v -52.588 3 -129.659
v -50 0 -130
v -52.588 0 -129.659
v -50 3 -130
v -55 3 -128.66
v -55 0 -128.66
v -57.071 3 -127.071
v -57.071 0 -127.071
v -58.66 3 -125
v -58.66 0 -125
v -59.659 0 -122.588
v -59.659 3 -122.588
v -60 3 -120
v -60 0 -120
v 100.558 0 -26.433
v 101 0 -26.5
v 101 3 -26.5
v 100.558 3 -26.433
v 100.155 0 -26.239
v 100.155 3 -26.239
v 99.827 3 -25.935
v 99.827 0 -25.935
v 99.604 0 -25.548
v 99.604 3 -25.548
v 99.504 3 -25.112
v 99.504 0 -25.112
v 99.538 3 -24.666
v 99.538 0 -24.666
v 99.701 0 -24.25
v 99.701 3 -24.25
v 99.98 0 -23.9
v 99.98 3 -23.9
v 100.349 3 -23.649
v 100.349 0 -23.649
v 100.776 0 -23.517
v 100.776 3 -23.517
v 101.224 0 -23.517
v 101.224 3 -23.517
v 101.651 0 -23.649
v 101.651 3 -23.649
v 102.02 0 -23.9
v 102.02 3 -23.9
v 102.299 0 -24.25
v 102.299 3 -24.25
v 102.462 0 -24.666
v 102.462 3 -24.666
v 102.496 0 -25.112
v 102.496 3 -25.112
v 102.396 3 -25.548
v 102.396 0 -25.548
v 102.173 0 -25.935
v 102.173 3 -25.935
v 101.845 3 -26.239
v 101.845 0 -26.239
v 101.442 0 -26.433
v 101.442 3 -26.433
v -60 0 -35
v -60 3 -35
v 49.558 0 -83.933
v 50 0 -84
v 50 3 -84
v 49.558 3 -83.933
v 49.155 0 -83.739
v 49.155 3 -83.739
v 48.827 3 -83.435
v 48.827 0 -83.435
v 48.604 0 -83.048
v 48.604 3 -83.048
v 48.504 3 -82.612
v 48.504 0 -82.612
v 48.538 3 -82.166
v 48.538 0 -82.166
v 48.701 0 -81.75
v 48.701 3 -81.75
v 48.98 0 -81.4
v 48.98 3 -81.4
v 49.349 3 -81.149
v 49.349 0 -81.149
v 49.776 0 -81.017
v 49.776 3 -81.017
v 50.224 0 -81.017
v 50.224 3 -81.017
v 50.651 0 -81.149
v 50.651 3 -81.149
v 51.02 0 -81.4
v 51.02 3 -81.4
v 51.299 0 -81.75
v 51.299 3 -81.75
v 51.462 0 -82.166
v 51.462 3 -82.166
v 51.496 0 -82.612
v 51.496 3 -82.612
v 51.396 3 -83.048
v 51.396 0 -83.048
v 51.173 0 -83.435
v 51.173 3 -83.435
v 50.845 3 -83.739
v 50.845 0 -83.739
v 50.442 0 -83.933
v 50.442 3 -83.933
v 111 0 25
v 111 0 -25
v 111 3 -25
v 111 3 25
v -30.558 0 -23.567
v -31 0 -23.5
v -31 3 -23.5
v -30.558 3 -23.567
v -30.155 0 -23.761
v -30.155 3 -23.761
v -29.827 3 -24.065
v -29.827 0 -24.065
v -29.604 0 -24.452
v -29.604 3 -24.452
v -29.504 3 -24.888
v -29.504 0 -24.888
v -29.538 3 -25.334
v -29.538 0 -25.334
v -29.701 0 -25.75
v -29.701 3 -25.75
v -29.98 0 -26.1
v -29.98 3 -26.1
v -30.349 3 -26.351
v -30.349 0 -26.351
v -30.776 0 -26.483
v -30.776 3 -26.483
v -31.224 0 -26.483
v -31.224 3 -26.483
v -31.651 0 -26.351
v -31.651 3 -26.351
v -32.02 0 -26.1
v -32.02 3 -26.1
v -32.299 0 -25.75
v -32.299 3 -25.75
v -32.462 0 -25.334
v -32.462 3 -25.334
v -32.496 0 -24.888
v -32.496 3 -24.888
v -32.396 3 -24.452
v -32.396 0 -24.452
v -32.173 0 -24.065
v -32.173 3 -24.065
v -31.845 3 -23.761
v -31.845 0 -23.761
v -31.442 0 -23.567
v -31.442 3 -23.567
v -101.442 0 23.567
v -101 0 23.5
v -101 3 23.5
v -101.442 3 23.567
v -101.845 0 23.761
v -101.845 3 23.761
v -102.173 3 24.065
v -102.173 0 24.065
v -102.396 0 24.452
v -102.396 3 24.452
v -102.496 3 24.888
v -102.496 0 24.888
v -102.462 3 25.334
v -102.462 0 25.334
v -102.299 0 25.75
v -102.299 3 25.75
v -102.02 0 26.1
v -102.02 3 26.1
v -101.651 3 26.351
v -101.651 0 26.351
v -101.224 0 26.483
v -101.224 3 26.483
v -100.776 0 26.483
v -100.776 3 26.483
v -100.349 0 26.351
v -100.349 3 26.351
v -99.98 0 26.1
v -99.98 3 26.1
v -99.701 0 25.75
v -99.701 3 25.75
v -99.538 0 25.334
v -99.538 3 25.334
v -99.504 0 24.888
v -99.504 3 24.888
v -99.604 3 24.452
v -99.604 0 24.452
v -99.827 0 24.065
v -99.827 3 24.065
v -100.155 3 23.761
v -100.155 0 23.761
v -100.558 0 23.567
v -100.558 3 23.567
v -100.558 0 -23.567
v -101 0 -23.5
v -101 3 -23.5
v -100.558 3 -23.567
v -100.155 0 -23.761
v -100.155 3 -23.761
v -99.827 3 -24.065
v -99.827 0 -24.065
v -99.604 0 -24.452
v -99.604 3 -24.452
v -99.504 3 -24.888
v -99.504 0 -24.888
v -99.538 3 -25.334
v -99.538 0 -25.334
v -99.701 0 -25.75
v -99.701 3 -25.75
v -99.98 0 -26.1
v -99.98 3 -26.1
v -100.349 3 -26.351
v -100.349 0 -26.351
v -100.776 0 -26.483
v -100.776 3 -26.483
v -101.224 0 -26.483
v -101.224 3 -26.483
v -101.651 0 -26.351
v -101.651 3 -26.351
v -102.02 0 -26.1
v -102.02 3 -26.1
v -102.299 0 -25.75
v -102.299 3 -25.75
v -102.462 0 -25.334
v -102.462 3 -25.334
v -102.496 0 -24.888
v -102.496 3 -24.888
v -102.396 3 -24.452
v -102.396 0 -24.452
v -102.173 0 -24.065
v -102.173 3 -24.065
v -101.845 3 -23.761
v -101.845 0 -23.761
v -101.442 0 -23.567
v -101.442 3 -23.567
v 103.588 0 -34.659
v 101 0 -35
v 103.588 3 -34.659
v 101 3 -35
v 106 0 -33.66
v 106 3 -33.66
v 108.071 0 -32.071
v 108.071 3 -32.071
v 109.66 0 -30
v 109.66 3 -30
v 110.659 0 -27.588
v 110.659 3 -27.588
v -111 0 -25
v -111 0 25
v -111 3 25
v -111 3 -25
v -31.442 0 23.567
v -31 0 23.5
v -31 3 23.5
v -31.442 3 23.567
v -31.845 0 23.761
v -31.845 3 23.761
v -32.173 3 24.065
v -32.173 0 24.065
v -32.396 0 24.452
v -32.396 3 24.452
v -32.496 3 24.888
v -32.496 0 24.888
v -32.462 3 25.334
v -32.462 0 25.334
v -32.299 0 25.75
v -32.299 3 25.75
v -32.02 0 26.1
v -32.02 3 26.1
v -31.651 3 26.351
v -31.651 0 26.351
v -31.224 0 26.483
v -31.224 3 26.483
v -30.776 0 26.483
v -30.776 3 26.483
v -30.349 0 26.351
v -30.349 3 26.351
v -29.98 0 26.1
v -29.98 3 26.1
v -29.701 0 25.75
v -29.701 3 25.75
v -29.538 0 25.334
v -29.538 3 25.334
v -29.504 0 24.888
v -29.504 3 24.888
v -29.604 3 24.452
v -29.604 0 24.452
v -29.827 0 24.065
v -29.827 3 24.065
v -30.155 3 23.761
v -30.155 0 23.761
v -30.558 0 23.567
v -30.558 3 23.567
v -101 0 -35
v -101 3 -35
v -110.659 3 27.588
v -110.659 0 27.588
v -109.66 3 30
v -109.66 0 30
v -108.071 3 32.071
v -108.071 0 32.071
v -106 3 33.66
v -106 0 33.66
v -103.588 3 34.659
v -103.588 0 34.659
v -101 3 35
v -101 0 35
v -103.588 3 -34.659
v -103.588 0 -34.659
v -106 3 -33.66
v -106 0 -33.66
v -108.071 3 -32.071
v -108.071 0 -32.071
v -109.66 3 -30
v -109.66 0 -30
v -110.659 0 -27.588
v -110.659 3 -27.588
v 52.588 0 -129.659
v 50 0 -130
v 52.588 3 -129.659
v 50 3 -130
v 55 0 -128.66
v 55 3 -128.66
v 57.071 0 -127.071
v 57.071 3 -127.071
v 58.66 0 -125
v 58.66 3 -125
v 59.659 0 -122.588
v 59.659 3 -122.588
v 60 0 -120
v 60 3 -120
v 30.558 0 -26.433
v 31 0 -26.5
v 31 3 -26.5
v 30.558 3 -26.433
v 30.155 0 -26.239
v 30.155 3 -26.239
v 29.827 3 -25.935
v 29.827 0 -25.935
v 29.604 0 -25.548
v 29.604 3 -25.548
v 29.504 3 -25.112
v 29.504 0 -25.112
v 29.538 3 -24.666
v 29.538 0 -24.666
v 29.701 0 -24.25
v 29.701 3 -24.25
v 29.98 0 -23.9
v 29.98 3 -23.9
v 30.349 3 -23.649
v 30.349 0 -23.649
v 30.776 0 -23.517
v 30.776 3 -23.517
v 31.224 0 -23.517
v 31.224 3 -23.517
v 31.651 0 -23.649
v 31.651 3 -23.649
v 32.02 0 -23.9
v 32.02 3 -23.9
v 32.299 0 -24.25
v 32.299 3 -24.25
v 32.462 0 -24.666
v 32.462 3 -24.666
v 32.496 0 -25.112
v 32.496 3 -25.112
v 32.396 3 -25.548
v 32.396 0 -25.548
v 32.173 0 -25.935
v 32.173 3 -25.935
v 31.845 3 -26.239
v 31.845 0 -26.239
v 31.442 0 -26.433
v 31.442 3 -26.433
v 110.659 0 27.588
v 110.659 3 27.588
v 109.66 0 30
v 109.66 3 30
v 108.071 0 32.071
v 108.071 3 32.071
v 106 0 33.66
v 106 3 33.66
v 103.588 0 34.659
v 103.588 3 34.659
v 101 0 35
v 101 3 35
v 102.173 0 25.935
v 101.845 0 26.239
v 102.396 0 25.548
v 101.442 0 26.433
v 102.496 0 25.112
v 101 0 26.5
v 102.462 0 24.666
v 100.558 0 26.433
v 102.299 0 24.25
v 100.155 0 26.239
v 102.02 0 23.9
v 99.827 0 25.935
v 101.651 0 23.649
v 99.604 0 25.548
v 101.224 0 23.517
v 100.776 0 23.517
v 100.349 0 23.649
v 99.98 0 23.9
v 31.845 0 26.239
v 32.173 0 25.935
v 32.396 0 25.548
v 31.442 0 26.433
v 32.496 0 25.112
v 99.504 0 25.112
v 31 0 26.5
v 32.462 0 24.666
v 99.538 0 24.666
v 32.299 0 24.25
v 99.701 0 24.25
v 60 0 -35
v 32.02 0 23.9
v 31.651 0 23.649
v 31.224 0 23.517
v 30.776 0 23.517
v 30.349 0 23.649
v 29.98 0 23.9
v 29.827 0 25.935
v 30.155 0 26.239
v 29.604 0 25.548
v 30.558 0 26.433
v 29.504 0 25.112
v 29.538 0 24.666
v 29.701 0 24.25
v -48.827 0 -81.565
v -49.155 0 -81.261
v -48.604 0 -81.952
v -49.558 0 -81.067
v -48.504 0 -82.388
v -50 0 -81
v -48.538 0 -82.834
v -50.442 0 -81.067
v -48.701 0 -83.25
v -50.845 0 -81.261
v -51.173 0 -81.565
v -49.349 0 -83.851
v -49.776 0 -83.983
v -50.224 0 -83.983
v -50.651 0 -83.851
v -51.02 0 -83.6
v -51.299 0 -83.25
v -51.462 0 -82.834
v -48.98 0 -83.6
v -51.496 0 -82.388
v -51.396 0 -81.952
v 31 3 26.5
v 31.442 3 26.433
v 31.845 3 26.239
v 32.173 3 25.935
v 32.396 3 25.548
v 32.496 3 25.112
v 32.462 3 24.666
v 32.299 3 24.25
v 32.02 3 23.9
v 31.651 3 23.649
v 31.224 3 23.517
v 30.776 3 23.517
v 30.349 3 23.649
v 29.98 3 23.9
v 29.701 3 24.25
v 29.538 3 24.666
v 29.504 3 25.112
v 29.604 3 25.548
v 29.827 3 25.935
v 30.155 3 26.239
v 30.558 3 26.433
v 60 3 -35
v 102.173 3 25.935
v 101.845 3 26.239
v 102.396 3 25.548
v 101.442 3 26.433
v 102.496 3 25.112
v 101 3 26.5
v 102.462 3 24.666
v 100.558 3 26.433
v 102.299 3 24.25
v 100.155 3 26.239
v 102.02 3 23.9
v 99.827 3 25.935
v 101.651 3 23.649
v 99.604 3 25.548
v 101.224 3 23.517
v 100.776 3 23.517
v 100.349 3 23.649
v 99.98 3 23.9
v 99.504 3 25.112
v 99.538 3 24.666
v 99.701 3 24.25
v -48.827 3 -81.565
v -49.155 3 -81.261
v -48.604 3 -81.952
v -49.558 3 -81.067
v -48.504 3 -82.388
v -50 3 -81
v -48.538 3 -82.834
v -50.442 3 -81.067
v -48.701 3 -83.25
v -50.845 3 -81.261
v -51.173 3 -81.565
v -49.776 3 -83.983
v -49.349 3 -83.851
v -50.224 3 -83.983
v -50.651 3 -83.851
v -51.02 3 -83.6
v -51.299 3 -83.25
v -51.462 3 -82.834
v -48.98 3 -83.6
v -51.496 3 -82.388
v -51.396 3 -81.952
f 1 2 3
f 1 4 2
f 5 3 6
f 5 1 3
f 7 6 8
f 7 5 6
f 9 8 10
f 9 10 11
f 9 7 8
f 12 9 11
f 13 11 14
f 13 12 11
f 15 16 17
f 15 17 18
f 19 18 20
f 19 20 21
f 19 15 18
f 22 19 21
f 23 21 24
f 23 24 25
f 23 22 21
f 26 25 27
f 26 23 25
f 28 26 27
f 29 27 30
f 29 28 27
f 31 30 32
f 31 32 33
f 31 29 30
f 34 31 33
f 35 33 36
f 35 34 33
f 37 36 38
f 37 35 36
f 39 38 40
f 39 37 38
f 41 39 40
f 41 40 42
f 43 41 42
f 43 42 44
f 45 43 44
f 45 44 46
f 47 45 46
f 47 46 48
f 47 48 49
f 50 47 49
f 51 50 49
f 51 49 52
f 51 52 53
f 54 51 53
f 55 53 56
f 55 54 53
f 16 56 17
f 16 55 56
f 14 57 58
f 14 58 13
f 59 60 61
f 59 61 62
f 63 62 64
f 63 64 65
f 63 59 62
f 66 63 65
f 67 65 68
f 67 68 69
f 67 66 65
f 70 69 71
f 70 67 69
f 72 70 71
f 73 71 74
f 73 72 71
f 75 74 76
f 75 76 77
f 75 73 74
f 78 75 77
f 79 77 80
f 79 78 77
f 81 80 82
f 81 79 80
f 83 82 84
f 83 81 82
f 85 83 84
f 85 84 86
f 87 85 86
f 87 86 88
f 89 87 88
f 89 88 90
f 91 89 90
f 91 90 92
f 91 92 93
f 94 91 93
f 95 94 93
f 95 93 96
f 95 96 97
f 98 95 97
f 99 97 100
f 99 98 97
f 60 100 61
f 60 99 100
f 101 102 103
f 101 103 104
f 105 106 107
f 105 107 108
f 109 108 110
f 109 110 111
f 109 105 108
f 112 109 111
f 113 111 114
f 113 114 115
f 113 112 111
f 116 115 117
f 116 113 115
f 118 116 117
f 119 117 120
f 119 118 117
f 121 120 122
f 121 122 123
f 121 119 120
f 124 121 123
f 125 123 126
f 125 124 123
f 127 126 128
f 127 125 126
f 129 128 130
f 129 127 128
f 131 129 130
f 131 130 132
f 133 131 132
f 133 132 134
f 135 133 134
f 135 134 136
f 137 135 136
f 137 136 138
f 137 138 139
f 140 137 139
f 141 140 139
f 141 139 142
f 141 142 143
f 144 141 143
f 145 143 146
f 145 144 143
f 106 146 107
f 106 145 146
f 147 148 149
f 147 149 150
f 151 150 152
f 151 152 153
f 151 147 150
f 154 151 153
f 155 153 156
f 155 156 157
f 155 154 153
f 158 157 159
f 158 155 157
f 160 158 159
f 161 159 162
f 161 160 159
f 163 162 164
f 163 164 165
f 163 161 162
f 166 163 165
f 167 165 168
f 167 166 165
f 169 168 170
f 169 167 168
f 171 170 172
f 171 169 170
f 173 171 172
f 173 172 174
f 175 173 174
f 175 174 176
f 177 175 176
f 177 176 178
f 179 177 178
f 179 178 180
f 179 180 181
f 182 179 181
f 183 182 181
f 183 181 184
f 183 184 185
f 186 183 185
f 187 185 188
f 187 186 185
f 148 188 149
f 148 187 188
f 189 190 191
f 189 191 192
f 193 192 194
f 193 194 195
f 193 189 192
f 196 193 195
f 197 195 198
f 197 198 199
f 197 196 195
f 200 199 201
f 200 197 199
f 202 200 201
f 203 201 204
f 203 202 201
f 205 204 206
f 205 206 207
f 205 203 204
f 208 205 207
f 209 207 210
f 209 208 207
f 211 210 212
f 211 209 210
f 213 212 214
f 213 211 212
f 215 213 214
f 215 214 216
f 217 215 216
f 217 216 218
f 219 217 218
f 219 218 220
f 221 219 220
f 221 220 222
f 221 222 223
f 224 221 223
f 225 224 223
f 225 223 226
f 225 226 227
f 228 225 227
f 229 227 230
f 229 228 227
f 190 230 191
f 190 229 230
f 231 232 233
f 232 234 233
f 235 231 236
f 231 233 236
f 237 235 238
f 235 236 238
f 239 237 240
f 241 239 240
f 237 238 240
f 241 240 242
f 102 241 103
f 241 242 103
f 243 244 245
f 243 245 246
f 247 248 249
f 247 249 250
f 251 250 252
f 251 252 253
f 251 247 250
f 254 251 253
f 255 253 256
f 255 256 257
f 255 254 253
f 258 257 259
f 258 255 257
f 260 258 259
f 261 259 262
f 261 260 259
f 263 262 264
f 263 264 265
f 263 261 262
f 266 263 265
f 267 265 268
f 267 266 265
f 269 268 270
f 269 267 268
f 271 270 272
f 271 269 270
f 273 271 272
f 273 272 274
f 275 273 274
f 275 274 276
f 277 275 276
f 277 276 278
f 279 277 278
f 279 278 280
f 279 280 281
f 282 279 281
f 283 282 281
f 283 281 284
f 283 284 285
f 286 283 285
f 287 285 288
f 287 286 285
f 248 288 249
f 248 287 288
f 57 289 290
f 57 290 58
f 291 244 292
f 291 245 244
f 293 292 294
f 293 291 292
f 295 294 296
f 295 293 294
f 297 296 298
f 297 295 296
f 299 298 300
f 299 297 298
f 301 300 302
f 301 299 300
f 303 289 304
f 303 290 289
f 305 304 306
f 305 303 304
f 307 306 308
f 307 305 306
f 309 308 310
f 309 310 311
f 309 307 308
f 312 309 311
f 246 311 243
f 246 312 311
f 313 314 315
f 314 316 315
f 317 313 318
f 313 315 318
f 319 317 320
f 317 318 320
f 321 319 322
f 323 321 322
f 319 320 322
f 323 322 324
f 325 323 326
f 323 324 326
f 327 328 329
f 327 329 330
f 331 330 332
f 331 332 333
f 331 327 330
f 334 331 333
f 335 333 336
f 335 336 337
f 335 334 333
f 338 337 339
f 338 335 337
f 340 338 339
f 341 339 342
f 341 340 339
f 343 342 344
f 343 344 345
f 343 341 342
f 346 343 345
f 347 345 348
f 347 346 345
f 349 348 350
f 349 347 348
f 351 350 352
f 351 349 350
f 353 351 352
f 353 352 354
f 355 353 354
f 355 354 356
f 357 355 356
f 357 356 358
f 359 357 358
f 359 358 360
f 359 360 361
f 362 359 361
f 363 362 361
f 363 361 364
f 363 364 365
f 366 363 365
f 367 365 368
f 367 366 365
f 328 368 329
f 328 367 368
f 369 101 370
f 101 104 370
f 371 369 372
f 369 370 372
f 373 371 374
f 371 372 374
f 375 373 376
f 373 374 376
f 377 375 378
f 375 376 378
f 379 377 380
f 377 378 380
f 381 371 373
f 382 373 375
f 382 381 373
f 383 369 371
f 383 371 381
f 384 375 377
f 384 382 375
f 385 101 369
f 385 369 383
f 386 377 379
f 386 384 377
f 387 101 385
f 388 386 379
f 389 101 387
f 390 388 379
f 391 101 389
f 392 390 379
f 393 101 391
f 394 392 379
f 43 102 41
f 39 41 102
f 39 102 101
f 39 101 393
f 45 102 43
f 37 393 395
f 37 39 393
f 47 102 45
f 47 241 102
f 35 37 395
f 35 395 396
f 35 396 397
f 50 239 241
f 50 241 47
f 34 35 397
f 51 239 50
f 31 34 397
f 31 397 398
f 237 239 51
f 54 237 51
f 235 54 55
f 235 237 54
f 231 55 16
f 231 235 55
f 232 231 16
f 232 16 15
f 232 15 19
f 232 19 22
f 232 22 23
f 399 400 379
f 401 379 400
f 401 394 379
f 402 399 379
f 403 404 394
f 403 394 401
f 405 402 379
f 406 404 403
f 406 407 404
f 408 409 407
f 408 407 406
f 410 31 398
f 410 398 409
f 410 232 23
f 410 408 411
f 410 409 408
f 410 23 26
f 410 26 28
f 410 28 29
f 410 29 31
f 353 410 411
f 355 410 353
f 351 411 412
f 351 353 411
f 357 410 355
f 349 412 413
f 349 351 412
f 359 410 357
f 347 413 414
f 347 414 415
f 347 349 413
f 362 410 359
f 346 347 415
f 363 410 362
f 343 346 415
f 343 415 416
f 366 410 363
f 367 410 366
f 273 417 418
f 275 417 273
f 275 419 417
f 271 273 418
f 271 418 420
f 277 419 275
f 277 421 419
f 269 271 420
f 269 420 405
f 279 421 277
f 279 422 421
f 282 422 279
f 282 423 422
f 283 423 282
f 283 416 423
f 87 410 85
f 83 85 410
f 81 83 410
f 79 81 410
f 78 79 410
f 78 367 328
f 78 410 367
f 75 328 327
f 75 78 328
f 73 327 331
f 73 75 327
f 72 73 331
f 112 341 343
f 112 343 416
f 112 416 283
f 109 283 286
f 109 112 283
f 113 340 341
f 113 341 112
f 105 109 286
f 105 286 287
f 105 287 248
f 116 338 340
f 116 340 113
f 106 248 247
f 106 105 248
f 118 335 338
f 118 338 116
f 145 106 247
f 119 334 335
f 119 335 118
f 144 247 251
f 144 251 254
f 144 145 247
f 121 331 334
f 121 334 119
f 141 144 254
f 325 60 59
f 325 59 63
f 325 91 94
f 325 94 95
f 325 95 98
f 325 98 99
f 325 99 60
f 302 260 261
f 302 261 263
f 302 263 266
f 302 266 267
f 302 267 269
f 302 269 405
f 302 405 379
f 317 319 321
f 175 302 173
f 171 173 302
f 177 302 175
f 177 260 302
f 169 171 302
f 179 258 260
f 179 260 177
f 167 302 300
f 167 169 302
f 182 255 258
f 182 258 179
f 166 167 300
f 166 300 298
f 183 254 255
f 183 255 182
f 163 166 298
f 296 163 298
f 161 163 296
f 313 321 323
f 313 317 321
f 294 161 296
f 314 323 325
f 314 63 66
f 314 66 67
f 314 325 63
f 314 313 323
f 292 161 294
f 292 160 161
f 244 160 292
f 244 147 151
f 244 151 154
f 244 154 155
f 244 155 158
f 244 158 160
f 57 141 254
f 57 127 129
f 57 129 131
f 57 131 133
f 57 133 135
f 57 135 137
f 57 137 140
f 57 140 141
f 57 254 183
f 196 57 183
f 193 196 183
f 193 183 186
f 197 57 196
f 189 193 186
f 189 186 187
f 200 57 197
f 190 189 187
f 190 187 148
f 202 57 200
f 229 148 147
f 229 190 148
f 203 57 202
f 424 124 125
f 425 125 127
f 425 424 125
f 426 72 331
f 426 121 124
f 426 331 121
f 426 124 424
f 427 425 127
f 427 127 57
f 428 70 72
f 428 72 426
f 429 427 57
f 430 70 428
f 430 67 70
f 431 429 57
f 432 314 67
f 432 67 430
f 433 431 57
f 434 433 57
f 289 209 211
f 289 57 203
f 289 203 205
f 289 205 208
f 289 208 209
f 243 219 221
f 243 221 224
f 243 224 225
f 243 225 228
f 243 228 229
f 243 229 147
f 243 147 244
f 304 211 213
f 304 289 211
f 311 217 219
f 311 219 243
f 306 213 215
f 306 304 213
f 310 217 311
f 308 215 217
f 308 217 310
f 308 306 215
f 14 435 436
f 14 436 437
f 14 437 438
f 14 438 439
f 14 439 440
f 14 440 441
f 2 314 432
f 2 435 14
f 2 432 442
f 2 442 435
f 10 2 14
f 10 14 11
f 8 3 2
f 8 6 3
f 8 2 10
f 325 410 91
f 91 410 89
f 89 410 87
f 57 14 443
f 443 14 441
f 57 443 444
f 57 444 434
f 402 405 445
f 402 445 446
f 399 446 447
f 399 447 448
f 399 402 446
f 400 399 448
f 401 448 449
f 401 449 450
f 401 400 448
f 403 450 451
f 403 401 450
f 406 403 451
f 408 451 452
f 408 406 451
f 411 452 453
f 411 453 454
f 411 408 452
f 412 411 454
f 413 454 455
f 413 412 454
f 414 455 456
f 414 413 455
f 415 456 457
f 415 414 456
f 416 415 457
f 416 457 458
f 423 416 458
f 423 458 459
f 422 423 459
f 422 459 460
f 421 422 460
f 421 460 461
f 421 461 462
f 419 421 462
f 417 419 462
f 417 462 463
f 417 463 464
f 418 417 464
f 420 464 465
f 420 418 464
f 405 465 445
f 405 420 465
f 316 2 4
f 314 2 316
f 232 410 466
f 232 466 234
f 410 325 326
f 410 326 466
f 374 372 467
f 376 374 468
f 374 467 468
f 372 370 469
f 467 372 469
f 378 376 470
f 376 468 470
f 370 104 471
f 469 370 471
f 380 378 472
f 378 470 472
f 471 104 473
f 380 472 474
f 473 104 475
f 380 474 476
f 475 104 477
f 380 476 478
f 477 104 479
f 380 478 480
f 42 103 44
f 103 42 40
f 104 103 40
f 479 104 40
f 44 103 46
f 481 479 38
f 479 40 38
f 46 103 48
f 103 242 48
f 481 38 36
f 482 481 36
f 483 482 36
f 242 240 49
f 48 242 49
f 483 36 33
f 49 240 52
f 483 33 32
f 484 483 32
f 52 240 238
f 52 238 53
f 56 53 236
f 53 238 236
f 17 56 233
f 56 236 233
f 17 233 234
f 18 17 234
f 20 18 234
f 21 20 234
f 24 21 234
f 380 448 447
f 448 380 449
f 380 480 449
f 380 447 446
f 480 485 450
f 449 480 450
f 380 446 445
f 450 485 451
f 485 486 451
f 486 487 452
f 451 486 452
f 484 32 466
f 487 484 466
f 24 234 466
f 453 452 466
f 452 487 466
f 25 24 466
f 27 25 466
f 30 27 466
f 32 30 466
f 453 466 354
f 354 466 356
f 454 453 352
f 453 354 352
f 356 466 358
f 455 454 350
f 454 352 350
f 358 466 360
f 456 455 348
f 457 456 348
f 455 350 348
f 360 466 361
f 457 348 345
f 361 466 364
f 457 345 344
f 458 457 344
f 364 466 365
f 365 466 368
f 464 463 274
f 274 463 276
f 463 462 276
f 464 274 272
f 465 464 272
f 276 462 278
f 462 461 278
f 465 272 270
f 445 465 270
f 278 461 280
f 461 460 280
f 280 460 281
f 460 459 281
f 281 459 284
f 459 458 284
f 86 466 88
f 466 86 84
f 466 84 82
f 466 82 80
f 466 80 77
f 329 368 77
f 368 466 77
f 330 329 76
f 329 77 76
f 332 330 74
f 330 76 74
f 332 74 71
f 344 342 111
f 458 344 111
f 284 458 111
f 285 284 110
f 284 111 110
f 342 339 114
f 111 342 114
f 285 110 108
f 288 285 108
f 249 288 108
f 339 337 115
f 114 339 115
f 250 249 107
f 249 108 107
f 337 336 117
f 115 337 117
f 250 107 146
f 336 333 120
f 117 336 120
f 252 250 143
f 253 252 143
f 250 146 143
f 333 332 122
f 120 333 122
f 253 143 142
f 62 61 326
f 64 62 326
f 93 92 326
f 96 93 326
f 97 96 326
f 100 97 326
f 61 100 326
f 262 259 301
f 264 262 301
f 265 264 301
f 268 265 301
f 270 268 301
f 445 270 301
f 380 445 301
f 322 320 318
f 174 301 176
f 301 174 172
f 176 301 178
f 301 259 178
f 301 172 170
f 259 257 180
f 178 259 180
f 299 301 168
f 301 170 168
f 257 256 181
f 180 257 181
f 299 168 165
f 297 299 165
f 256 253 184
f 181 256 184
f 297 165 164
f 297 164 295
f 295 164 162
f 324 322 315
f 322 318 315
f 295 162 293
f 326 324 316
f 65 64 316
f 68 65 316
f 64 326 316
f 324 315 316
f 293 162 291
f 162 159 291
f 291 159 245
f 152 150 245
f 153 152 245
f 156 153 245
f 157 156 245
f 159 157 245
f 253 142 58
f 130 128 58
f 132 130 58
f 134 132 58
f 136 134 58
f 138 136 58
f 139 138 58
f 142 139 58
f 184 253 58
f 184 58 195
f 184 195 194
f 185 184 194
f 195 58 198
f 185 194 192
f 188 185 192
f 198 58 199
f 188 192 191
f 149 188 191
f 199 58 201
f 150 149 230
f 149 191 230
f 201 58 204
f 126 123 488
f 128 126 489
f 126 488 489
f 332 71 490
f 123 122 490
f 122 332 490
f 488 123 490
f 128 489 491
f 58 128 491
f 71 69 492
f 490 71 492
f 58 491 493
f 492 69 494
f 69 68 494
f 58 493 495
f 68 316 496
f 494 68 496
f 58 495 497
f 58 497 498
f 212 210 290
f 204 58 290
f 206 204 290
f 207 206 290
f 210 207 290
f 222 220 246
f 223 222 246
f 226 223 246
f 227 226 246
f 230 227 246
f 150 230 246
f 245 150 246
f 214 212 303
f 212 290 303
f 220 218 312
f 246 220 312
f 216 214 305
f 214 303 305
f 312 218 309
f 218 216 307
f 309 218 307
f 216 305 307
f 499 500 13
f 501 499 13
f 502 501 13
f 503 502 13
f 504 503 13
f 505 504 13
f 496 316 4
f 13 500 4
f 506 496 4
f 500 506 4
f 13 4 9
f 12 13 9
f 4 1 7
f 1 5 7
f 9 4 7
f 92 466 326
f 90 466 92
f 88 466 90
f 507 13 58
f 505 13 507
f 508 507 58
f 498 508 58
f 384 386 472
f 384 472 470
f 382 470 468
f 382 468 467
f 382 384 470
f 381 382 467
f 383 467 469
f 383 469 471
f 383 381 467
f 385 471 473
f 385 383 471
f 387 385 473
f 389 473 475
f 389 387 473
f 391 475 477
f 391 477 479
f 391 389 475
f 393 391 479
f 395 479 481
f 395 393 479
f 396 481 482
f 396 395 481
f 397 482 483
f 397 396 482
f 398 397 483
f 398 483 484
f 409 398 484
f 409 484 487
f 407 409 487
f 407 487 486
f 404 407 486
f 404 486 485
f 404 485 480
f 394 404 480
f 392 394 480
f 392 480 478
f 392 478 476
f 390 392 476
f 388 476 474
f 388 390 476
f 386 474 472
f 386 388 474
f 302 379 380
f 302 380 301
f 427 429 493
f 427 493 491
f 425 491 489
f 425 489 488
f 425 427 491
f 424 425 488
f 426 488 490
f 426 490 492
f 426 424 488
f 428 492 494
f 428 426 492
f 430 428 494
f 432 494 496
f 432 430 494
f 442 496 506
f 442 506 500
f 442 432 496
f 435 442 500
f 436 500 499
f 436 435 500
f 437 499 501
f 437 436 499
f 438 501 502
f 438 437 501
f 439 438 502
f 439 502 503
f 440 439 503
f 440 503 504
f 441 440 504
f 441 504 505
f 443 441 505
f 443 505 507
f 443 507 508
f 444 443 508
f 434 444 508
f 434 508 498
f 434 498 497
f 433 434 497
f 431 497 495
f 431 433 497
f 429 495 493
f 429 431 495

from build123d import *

# Parameters (mm, degrees)
SKETCH1_R           = 1.5
BOSS_EXTRUDE1_DEPTH = 3
FILLET1_R           = 10


with BuildPart() as part:
    # Sketch1 → Boss-Extrude1 (new body)
    with BuildSketch(Plane(origin=(0, 0, 0), x_dir=(1, 0, 0), z_dir=(0, 1, 0))):
        Polygon((-60, 130), (60, 130), (60, 35), (111, 35), (111, -35), (-111, -35), (-111, 35), (-60, 35), align=None)
        with Locations(Location((-50, 82.5, 0), (0, 0, 270))):
            Circle(SKETCH1_R, mode=Mode.SUBTRACT)
        with Locations(Location((-101, 25, 0), (0, 0, 270))):
            Circle(SKETCH1_R, mode=Mode.SUBTRACT)
        with Locations(Location((-101, -25, 0), (0, 0, 90))):
            Circle(SKETCH1_R, mode=Mode.SUBTRACT)
        with Locations(Location((-31, 25, 0), (0, 0, 270))):
            Circle(SKETCH1_R, mode=Mode.SUBTRACT)
        with Locations(Location((-31, -25, 0), (0, 0, 90))):
            Circle(SKETCH1_R, mode=Mode.SUBTRACT)
        with Locations(Location((101, 25, 0), (0, 0, 90))):
            Circle(SKETCH1_R, mode=Mode.SUBTRACT)
        with Locations(Location((101, -25, 0), (0, 0, 270))):
            Circle(SKETCH1_R, mode=Mode.SUBTRACT)
        with Locations(Location((31, -25, 0), (0, 0, 270))):
            Circle(SKETCH1_R, mode=Mode.SUBTRACT)
        with Locations(Location((31, 25, 0), (0, 0, 90))):
            Circle(SKETCH1_R, mode=Mode.SUBTRACT)
        with Locations(Location((50, 82.5, 0), (0, 0, 90))):
            Circle(SKETCH1_R, mode=Mode.SUBTRACT)
    extrude(amount=BOSS_EXTRUDE1_DEPTH)

    # Fillet1
    fillet1_edges = [part.edges().sort_by_distance(p)[0] for p in [
        (111, 1.5, -35),
        (111, 1.5, 35),
        (-111, 1.5, 35),
        (-111, 1.5, -35),
        (-60, 1.5, -130),
        (60, 1.5, -130),
    ]]
    fillet(fillet1_edges, radius=FILLET1_R)


solid = part.part
